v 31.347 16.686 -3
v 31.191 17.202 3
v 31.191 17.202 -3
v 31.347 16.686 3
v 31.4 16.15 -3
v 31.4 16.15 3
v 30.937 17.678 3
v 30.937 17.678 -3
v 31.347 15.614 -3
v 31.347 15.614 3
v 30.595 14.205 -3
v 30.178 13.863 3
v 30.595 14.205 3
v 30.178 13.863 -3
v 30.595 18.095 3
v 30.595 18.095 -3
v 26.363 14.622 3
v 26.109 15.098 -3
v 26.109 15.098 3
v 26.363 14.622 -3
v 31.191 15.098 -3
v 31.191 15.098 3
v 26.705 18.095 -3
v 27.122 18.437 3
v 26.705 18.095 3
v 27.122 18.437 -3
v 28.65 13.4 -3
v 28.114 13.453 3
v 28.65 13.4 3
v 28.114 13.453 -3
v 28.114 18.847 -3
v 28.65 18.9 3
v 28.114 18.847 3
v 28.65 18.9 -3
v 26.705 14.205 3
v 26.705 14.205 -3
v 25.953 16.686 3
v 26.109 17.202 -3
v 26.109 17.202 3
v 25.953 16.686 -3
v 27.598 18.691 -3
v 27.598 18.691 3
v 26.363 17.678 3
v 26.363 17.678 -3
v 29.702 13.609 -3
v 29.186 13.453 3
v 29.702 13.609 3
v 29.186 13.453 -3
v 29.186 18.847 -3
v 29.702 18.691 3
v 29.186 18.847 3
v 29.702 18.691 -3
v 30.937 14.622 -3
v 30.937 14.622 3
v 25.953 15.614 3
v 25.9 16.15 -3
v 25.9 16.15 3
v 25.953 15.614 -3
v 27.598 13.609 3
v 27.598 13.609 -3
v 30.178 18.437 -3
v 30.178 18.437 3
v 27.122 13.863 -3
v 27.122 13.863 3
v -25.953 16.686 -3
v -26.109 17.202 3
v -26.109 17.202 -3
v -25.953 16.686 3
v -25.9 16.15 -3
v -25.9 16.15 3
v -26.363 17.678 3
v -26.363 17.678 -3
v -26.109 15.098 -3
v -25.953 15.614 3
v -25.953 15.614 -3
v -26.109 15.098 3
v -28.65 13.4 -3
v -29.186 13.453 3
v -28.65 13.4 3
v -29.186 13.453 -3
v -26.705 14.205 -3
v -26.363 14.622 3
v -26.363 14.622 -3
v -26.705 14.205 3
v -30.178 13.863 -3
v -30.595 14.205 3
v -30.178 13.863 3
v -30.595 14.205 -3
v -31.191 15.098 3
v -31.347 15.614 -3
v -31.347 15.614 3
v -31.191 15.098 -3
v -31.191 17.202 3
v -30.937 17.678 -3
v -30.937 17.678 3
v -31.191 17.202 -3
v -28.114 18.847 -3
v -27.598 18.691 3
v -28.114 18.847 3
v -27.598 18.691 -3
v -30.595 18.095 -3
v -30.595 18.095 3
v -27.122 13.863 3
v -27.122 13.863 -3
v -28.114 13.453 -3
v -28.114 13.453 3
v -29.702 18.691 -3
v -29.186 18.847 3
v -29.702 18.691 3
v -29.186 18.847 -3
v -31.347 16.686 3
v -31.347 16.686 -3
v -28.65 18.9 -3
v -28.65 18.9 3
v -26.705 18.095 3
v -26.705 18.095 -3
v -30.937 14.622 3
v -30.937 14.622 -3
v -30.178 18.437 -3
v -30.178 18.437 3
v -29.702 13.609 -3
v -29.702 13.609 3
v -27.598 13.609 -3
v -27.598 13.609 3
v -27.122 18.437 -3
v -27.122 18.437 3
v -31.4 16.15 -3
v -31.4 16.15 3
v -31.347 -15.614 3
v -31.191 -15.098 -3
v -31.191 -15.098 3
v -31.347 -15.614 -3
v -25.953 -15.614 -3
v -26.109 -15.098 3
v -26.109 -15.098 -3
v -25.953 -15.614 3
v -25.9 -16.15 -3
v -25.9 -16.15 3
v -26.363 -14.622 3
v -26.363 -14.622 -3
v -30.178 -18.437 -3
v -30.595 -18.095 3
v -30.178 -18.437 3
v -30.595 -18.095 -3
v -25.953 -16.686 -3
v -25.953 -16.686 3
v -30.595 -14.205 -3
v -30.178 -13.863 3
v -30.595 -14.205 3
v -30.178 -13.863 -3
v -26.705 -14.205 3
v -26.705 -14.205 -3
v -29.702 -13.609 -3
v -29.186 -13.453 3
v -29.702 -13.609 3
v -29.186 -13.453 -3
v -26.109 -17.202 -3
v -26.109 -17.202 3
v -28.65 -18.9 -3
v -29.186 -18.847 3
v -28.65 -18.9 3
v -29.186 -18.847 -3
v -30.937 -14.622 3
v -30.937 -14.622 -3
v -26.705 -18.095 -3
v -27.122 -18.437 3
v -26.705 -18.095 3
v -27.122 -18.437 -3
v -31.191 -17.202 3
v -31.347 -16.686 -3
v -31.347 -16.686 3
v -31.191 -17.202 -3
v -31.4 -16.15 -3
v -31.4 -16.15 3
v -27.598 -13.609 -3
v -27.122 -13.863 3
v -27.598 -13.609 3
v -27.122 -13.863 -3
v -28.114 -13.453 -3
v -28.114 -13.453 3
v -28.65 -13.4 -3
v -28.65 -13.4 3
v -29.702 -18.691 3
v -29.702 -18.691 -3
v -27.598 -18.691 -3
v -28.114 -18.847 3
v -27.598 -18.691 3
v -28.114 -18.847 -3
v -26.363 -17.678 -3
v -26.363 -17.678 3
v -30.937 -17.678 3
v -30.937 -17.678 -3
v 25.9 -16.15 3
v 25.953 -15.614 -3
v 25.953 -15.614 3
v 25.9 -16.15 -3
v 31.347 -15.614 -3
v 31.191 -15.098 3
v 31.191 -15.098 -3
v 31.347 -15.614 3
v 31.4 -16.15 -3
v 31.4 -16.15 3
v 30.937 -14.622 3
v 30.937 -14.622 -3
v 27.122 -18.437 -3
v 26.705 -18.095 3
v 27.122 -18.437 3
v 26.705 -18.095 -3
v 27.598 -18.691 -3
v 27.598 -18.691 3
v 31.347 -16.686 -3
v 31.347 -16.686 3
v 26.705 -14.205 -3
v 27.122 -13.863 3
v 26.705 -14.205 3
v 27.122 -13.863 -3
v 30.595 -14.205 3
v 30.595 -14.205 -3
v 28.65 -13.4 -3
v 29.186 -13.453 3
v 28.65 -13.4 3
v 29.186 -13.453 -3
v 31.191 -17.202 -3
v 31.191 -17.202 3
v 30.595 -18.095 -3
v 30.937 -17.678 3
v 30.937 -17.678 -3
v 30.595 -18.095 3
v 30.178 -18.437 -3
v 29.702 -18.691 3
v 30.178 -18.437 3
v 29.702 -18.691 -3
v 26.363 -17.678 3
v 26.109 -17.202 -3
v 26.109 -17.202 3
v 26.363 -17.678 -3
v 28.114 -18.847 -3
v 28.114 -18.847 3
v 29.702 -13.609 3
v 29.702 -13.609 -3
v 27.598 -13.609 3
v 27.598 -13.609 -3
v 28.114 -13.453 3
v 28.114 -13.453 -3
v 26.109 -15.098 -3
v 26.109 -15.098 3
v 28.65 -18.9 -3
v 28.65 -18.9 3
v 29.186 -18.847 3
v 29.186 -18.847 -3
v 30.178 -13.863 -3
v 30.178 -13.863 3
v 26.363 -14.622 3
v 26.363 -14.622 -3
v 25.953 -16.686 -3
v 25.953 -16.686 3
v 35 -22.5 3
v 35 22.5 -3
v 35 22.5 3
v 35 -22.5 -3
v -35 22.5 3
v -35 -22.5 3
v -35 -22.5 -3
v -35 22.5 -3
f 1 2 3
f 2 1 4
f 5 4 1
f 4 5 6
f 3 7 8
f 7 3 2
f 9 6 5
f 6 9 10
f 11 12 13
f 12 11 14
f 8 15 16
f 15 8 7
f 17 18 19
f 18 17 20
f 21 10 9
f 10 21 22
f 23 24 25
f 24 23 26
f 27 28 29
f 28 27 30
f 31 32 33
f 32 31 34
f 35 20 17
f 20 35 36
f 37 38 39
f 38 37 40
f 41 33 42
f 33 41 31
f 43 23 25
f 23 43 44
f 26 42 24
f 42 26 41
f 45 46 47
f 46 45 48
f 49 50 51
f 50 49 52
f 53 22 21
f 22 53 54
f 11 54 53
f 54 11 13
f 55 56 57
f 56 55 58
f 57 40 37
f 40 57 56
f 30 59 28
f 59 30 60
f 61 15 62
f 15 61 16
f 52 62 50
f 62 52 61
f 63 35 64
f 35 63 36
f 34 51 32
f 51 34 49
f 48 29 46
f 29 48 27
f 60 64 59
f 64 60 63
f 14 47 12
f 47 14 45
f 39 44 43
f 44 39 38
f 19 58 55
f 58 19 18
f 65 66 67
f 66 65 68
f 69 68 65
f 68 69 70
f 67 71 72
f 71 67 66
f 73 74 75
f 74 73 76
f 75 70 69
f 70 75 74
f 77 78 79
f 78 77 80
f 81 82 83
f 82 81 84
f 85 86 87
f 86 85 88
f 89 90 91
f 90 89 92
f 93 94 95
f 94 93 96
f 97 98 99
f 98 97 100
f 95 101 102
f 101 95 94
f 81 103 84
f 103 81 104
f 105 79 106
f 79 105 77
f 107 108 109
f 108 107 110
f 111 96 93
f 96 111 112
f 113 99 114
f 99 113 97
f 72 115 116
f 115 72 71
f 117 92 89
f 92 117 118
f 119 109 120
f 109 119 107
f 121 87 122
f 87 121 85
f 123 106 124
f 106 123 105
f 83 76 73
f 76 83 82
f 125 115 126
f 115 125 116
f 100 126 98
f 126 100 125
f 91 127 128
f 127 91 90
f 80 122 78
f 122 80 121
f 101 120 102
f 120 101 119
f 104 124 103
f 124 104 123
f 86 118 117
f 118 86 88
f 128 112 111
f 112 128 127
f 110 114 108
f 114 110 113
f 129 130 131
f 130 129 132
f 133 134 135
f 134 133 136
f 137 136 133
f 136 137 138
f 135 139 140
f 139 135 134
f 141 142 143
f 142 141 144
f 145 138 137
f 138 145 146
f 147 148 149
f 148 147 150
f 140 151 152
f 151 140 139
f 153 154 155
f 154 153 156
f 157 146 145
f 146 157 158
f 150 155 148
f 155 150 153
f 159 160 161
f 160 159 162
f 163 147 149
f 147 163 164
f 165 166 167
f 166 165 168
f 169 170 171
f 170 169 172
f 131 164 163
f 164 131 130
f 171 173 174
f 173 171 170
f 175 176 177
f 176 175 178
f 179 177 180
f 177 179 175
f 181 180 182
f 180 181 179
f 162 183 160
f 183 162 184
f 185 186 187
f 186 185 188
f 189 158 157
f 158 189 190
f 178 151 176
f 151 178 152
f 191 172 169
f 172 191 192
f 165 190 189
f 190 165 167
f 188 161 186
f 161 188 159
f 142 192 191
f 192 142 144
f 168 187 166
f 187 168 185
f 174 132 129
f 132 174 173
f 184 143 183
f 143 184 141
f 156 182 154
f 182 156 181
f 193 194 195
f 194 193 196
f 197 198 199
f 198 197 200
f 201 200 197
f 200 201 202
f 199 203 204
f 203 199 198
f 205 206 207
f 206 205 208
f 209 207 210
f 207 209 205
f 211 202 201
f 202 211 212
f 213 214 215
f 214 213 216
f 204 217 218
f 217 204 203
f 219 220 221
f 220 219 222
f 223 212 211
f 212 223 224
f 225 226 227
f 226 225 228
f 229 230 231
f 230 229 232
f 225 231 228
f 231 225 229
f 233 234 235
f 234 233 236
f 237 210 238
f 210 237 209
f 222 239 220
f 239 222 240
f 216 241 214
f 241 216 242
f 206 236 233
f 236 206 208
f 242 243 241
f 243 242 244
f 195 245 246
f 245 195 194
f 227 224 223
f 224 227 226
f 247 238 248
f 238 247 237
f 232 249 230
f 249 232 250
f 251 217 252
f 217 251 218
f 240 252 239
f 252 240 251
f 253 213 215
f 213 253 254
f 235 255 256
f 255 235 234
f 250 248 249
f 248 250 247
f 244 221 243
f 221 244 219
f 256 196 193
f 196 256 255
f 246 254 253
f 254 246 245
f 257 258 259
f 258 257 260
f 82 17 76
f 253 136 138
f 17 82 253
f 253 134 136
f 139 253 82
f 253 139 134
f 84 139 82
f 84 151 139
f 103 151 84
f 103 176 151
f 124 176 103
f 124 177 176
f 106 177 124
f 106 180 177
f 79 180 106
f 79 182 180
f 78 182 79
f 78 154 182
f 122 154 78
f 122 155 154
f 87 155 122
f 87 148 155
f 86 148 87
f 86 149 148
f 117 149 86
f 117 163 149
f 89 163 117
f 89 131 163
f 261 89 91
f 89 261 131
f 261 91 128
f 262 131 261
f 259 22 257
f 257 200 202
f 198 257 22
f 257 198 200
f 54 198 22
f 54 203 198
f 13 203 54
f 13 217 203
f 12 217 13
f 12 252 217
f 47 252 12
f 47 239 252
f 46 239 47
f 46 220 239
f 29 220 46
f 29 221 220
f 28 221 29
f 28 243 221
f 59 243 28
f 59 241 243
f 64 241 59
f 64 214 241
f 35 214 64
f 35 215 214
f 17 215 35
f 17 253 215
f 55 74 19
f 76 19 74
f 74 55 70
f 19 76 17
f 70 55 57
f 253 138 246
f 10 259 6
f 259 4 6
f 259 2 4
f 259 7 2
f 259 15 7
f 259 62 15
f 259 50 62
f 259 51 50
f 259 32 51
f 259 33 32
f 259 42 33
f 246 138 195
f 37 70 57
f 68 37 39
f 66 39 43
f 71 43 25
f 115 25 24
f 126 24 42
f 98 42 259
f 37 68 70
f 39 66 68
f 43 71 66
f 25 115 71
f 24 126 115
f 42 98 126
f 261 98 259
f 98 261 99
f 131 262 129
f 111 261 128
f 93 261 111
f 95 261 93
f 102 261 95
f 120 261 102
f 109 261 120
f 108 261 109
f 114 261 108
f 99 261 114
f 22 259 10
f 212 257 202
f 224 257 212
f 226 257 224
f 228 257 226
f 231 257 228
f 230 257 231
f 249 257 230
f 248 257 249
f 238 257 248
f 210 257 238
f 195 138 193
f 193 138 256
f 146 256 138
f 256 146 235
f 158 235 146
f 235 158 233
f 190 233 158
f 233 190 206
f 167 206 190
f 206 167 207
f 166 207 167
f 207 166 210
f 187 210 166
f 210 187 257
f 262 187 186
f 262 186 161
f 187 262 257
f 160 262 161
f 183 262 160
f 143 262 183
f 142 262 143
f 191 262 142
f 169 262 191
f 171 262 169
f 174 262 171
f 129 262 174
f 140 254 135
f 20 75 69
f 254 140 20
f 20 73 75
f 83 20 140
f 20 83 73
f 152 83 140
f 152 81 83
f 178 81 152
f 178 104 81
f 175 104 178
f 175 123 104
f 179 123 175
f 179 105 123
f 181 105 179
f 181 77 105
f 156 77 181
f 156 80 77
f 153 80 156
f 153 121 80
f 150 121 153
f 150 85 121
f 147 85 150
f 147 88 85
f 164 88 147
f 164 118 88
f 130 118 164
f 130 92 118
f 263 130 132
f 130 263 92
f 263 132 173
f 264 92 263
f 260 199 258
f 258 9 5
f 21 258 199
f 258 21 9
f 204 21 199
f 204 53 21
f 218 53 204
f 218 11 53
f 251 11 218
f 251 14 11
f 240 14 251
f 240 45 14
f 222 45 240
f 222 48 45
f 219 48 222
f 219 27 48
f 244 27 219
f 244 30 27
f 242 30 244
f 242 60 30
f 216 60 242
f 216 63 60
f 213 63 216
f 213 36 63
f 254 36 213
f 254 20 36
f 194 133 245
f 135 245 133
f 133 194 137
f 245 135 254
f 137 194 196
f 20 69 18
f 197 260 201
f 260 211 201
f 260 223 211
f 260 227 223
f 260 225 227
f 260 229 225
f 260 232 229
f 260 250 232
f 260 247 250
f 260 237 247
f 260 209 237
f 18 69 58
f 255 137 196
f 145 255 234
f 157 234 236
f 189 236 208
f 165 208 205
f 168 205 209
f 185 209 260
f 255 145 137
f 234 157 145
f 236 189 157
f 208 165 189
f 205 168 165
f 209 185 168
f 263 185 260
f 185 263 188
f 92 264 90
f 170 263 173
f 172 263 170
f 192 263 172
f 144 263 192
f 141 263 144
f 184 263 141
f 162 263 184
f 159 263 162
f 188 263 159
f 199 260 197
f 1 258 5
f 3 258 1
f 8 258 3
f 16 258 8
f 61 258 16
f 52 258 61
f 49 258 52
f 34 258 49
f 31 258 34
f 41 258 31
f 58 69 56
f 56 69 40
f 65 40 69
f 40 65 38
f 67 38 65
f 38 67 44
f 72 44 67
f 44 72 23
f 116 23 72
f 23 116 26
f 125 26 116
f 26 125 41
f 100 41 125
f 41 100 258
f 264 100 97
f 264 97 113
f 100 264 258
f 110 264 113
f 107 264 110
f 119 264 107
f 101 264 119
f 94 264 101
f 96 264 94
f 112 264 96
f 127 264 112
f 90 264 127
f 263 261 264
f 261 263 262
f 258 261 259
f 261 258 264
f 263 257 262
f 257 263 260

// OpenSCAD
$fn = 32;

// ----------------------------------------------------------------------
// Corner plate 70 x 45 x 6
// 4 holes, centres taken from the edge offset
// ----------------------------------------------------------------------

// --- parameters (mm) ---
plate = [70, 45, 6];  // overall size (x, y, z)
holes = 4;            // number of holes the drawing asks for
hole_d = 5.5;         // hole diameter
edge = 6.35;          // hole centre offset from the plate edge

// --- derived feature positions (mm) ---
corner_x = plate[0] / 2 - edge;  // = 28.65   corner hole X
corner_y = plate[1] / 2 - edge;  // = 16.15   corner hole Y
feature_centers = [
  [corner_x, corner_y],
  [-corner_x, corner_y],
  [-corner_x, -corner_y],
  [corner_x, -corner_y]
];   // hole centres the loop below drills

// plate outline, every hole drilled through with the same cutters
difference() {
  cube(plate, center = true);
  for (centre = feature_centers)
    translate([centre[0], centre[1], 0])
      cylinder(d = hole_d, h = plate[2] + 2, center = true);
}
